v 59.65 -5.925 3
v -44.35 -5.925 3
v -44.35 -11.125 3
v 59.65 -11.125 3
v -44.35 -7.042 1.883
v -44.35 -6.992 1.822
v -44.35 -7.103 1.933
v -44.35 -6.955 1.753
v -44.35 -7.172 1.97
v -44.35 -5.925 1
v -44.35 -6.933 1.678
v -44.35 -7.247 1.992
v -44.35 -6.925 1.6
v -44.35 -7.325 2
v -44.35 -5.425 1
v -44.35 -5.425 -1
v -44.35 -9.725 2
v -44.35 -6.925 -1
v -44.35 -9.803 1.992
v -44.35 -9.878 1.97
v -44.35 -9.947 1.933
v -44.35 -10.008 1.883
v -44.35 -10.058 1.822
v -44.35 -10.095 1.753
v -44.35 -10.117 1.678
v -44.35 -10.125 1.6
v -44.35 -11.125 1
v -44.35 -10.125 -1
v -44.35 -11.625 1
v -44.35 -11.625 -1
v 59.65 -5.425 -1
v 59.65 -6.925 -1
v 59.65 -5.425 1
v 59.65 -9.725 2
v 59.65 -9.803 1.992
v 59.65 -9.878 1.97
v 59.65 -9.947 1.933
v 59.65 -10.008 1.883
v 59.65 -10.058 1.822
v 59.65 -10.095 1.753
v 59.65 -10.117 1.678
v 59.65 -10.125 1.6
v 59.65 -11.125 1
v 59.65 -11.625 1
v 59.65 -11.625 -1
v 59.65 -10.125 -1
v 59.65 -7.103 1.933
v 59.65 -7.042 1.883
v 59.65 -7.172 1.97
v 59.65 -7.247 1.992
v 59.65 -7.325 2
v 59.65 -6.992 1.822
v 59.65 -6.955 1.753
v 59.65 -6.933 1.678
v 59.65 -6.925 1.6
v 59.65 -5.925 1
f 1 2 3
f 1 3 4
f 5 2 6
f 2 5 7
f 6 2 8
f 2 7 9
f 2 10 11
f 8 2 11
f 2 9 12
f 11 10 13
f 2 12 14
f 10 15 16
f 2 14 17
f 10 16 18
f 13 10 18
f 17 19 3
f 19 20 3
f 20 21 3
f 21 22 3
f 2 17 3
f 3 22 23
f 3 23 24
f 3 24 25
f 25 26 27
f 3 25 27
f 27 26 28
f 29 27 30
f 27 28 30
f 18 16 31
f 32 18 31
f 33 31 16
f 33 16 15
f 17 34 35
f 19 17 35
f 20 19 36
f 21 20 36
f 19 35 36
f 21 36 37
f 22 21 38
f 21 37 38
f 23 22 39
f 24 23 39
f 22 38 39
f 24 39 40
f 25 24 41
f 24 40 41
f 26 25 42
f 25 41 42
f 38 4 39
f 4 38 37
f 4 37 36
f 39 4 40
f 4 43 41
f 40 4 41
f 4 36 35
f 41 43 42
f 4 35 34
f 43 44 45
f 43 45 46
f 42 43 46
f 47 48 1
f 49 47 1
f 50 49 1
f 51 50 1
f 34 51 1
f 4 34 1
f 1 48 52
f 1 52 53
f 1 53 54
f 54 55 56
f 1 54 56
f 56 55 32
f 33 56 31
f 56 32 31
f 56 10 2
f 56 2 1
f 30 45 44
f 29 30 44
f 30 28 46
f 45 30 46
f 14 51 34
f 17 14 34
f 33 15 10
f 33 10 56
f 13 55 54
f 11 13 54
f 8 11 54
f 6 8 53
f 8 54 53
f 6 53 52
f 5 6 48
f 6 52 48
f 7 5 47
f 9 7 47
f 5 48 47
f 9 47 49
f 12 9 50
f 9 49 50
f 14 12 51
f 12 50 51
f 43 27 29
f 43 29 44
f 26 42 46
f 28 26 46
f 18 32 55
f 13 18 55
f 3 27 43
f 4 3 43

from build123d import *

# Parameters (mm, degrees)
F0_W          = 104
F0_H          = 5.2
F1_DEPTH      = 3
F0_H_2        = 2
F2_DEPTH      = 1
F2_DEPTH_BACK = 1
F3_W          = 1.5
F3_H          = 2
F4_DEPTH      = 104


with BuildPart() as f1:
    # F0 (on Top) → F1 (new body)
    with BuildSketch(Plane.XY):
        with Locations((7.6501901746, -8.5250005215)):
            Rectangle(F0_W, F0_H)
    extrude(amount=F1_DEPTH)

    # F0 (on Top) → F2 (join, two sides)
    with BuildSketch(Plane.XY) as f2_sk:
        with Locations((7.6501901746, -4.9250005215)):
            Rectangle(F0_W, F0_H_2)
        with Locations((7.6501901746, -8.5250005215)):
            Rectangle(F0_W, F0_H)
        with Locations((7.6501901746, -12.1250005215)):
            Rectangle(F0_W, F0_H_2)
    extrude(amount=-F2_DEPTH)
    extrude(f2_sk.sketch, amount=F2_DEPTH_BACK)

    # F3 (on face) → F4 (cut)
    with BuildSketch(Plane.YZ.offset(59.6501901746)):
        with Locations((-12.3750005215, 0)):
            Rectangle(F3_W, F3_H)
        with BuildLine():
            Line((-10.1250005215, -1), (-6.9250005215, -1))
            Line((-6.9250005215, -1), (-6.9250005215, 1.6))
            ThreePointArc((-6.9250005215, 1.6), (-7.0421578091, 1.8828427125), (-7.3250005215, 2))
            Line((-7.3250005215, 2), (-9.7250005215, 2))
            ThreePointArc((-9.7250005215, 2), (-10.007843234, 1.8828427125), (-10.1250005215, 1.6))
            Line((-10.1250005215, 1.6), (-10.1250005215, -1))
        make_face()
        with Locations((-4.6750005215, 0)):
            Rectangle(F3_W, F3_H)
    extrude(amount=-F4_DEPTH, mode=Mode.SUBTRACT)


solid = f1.part
